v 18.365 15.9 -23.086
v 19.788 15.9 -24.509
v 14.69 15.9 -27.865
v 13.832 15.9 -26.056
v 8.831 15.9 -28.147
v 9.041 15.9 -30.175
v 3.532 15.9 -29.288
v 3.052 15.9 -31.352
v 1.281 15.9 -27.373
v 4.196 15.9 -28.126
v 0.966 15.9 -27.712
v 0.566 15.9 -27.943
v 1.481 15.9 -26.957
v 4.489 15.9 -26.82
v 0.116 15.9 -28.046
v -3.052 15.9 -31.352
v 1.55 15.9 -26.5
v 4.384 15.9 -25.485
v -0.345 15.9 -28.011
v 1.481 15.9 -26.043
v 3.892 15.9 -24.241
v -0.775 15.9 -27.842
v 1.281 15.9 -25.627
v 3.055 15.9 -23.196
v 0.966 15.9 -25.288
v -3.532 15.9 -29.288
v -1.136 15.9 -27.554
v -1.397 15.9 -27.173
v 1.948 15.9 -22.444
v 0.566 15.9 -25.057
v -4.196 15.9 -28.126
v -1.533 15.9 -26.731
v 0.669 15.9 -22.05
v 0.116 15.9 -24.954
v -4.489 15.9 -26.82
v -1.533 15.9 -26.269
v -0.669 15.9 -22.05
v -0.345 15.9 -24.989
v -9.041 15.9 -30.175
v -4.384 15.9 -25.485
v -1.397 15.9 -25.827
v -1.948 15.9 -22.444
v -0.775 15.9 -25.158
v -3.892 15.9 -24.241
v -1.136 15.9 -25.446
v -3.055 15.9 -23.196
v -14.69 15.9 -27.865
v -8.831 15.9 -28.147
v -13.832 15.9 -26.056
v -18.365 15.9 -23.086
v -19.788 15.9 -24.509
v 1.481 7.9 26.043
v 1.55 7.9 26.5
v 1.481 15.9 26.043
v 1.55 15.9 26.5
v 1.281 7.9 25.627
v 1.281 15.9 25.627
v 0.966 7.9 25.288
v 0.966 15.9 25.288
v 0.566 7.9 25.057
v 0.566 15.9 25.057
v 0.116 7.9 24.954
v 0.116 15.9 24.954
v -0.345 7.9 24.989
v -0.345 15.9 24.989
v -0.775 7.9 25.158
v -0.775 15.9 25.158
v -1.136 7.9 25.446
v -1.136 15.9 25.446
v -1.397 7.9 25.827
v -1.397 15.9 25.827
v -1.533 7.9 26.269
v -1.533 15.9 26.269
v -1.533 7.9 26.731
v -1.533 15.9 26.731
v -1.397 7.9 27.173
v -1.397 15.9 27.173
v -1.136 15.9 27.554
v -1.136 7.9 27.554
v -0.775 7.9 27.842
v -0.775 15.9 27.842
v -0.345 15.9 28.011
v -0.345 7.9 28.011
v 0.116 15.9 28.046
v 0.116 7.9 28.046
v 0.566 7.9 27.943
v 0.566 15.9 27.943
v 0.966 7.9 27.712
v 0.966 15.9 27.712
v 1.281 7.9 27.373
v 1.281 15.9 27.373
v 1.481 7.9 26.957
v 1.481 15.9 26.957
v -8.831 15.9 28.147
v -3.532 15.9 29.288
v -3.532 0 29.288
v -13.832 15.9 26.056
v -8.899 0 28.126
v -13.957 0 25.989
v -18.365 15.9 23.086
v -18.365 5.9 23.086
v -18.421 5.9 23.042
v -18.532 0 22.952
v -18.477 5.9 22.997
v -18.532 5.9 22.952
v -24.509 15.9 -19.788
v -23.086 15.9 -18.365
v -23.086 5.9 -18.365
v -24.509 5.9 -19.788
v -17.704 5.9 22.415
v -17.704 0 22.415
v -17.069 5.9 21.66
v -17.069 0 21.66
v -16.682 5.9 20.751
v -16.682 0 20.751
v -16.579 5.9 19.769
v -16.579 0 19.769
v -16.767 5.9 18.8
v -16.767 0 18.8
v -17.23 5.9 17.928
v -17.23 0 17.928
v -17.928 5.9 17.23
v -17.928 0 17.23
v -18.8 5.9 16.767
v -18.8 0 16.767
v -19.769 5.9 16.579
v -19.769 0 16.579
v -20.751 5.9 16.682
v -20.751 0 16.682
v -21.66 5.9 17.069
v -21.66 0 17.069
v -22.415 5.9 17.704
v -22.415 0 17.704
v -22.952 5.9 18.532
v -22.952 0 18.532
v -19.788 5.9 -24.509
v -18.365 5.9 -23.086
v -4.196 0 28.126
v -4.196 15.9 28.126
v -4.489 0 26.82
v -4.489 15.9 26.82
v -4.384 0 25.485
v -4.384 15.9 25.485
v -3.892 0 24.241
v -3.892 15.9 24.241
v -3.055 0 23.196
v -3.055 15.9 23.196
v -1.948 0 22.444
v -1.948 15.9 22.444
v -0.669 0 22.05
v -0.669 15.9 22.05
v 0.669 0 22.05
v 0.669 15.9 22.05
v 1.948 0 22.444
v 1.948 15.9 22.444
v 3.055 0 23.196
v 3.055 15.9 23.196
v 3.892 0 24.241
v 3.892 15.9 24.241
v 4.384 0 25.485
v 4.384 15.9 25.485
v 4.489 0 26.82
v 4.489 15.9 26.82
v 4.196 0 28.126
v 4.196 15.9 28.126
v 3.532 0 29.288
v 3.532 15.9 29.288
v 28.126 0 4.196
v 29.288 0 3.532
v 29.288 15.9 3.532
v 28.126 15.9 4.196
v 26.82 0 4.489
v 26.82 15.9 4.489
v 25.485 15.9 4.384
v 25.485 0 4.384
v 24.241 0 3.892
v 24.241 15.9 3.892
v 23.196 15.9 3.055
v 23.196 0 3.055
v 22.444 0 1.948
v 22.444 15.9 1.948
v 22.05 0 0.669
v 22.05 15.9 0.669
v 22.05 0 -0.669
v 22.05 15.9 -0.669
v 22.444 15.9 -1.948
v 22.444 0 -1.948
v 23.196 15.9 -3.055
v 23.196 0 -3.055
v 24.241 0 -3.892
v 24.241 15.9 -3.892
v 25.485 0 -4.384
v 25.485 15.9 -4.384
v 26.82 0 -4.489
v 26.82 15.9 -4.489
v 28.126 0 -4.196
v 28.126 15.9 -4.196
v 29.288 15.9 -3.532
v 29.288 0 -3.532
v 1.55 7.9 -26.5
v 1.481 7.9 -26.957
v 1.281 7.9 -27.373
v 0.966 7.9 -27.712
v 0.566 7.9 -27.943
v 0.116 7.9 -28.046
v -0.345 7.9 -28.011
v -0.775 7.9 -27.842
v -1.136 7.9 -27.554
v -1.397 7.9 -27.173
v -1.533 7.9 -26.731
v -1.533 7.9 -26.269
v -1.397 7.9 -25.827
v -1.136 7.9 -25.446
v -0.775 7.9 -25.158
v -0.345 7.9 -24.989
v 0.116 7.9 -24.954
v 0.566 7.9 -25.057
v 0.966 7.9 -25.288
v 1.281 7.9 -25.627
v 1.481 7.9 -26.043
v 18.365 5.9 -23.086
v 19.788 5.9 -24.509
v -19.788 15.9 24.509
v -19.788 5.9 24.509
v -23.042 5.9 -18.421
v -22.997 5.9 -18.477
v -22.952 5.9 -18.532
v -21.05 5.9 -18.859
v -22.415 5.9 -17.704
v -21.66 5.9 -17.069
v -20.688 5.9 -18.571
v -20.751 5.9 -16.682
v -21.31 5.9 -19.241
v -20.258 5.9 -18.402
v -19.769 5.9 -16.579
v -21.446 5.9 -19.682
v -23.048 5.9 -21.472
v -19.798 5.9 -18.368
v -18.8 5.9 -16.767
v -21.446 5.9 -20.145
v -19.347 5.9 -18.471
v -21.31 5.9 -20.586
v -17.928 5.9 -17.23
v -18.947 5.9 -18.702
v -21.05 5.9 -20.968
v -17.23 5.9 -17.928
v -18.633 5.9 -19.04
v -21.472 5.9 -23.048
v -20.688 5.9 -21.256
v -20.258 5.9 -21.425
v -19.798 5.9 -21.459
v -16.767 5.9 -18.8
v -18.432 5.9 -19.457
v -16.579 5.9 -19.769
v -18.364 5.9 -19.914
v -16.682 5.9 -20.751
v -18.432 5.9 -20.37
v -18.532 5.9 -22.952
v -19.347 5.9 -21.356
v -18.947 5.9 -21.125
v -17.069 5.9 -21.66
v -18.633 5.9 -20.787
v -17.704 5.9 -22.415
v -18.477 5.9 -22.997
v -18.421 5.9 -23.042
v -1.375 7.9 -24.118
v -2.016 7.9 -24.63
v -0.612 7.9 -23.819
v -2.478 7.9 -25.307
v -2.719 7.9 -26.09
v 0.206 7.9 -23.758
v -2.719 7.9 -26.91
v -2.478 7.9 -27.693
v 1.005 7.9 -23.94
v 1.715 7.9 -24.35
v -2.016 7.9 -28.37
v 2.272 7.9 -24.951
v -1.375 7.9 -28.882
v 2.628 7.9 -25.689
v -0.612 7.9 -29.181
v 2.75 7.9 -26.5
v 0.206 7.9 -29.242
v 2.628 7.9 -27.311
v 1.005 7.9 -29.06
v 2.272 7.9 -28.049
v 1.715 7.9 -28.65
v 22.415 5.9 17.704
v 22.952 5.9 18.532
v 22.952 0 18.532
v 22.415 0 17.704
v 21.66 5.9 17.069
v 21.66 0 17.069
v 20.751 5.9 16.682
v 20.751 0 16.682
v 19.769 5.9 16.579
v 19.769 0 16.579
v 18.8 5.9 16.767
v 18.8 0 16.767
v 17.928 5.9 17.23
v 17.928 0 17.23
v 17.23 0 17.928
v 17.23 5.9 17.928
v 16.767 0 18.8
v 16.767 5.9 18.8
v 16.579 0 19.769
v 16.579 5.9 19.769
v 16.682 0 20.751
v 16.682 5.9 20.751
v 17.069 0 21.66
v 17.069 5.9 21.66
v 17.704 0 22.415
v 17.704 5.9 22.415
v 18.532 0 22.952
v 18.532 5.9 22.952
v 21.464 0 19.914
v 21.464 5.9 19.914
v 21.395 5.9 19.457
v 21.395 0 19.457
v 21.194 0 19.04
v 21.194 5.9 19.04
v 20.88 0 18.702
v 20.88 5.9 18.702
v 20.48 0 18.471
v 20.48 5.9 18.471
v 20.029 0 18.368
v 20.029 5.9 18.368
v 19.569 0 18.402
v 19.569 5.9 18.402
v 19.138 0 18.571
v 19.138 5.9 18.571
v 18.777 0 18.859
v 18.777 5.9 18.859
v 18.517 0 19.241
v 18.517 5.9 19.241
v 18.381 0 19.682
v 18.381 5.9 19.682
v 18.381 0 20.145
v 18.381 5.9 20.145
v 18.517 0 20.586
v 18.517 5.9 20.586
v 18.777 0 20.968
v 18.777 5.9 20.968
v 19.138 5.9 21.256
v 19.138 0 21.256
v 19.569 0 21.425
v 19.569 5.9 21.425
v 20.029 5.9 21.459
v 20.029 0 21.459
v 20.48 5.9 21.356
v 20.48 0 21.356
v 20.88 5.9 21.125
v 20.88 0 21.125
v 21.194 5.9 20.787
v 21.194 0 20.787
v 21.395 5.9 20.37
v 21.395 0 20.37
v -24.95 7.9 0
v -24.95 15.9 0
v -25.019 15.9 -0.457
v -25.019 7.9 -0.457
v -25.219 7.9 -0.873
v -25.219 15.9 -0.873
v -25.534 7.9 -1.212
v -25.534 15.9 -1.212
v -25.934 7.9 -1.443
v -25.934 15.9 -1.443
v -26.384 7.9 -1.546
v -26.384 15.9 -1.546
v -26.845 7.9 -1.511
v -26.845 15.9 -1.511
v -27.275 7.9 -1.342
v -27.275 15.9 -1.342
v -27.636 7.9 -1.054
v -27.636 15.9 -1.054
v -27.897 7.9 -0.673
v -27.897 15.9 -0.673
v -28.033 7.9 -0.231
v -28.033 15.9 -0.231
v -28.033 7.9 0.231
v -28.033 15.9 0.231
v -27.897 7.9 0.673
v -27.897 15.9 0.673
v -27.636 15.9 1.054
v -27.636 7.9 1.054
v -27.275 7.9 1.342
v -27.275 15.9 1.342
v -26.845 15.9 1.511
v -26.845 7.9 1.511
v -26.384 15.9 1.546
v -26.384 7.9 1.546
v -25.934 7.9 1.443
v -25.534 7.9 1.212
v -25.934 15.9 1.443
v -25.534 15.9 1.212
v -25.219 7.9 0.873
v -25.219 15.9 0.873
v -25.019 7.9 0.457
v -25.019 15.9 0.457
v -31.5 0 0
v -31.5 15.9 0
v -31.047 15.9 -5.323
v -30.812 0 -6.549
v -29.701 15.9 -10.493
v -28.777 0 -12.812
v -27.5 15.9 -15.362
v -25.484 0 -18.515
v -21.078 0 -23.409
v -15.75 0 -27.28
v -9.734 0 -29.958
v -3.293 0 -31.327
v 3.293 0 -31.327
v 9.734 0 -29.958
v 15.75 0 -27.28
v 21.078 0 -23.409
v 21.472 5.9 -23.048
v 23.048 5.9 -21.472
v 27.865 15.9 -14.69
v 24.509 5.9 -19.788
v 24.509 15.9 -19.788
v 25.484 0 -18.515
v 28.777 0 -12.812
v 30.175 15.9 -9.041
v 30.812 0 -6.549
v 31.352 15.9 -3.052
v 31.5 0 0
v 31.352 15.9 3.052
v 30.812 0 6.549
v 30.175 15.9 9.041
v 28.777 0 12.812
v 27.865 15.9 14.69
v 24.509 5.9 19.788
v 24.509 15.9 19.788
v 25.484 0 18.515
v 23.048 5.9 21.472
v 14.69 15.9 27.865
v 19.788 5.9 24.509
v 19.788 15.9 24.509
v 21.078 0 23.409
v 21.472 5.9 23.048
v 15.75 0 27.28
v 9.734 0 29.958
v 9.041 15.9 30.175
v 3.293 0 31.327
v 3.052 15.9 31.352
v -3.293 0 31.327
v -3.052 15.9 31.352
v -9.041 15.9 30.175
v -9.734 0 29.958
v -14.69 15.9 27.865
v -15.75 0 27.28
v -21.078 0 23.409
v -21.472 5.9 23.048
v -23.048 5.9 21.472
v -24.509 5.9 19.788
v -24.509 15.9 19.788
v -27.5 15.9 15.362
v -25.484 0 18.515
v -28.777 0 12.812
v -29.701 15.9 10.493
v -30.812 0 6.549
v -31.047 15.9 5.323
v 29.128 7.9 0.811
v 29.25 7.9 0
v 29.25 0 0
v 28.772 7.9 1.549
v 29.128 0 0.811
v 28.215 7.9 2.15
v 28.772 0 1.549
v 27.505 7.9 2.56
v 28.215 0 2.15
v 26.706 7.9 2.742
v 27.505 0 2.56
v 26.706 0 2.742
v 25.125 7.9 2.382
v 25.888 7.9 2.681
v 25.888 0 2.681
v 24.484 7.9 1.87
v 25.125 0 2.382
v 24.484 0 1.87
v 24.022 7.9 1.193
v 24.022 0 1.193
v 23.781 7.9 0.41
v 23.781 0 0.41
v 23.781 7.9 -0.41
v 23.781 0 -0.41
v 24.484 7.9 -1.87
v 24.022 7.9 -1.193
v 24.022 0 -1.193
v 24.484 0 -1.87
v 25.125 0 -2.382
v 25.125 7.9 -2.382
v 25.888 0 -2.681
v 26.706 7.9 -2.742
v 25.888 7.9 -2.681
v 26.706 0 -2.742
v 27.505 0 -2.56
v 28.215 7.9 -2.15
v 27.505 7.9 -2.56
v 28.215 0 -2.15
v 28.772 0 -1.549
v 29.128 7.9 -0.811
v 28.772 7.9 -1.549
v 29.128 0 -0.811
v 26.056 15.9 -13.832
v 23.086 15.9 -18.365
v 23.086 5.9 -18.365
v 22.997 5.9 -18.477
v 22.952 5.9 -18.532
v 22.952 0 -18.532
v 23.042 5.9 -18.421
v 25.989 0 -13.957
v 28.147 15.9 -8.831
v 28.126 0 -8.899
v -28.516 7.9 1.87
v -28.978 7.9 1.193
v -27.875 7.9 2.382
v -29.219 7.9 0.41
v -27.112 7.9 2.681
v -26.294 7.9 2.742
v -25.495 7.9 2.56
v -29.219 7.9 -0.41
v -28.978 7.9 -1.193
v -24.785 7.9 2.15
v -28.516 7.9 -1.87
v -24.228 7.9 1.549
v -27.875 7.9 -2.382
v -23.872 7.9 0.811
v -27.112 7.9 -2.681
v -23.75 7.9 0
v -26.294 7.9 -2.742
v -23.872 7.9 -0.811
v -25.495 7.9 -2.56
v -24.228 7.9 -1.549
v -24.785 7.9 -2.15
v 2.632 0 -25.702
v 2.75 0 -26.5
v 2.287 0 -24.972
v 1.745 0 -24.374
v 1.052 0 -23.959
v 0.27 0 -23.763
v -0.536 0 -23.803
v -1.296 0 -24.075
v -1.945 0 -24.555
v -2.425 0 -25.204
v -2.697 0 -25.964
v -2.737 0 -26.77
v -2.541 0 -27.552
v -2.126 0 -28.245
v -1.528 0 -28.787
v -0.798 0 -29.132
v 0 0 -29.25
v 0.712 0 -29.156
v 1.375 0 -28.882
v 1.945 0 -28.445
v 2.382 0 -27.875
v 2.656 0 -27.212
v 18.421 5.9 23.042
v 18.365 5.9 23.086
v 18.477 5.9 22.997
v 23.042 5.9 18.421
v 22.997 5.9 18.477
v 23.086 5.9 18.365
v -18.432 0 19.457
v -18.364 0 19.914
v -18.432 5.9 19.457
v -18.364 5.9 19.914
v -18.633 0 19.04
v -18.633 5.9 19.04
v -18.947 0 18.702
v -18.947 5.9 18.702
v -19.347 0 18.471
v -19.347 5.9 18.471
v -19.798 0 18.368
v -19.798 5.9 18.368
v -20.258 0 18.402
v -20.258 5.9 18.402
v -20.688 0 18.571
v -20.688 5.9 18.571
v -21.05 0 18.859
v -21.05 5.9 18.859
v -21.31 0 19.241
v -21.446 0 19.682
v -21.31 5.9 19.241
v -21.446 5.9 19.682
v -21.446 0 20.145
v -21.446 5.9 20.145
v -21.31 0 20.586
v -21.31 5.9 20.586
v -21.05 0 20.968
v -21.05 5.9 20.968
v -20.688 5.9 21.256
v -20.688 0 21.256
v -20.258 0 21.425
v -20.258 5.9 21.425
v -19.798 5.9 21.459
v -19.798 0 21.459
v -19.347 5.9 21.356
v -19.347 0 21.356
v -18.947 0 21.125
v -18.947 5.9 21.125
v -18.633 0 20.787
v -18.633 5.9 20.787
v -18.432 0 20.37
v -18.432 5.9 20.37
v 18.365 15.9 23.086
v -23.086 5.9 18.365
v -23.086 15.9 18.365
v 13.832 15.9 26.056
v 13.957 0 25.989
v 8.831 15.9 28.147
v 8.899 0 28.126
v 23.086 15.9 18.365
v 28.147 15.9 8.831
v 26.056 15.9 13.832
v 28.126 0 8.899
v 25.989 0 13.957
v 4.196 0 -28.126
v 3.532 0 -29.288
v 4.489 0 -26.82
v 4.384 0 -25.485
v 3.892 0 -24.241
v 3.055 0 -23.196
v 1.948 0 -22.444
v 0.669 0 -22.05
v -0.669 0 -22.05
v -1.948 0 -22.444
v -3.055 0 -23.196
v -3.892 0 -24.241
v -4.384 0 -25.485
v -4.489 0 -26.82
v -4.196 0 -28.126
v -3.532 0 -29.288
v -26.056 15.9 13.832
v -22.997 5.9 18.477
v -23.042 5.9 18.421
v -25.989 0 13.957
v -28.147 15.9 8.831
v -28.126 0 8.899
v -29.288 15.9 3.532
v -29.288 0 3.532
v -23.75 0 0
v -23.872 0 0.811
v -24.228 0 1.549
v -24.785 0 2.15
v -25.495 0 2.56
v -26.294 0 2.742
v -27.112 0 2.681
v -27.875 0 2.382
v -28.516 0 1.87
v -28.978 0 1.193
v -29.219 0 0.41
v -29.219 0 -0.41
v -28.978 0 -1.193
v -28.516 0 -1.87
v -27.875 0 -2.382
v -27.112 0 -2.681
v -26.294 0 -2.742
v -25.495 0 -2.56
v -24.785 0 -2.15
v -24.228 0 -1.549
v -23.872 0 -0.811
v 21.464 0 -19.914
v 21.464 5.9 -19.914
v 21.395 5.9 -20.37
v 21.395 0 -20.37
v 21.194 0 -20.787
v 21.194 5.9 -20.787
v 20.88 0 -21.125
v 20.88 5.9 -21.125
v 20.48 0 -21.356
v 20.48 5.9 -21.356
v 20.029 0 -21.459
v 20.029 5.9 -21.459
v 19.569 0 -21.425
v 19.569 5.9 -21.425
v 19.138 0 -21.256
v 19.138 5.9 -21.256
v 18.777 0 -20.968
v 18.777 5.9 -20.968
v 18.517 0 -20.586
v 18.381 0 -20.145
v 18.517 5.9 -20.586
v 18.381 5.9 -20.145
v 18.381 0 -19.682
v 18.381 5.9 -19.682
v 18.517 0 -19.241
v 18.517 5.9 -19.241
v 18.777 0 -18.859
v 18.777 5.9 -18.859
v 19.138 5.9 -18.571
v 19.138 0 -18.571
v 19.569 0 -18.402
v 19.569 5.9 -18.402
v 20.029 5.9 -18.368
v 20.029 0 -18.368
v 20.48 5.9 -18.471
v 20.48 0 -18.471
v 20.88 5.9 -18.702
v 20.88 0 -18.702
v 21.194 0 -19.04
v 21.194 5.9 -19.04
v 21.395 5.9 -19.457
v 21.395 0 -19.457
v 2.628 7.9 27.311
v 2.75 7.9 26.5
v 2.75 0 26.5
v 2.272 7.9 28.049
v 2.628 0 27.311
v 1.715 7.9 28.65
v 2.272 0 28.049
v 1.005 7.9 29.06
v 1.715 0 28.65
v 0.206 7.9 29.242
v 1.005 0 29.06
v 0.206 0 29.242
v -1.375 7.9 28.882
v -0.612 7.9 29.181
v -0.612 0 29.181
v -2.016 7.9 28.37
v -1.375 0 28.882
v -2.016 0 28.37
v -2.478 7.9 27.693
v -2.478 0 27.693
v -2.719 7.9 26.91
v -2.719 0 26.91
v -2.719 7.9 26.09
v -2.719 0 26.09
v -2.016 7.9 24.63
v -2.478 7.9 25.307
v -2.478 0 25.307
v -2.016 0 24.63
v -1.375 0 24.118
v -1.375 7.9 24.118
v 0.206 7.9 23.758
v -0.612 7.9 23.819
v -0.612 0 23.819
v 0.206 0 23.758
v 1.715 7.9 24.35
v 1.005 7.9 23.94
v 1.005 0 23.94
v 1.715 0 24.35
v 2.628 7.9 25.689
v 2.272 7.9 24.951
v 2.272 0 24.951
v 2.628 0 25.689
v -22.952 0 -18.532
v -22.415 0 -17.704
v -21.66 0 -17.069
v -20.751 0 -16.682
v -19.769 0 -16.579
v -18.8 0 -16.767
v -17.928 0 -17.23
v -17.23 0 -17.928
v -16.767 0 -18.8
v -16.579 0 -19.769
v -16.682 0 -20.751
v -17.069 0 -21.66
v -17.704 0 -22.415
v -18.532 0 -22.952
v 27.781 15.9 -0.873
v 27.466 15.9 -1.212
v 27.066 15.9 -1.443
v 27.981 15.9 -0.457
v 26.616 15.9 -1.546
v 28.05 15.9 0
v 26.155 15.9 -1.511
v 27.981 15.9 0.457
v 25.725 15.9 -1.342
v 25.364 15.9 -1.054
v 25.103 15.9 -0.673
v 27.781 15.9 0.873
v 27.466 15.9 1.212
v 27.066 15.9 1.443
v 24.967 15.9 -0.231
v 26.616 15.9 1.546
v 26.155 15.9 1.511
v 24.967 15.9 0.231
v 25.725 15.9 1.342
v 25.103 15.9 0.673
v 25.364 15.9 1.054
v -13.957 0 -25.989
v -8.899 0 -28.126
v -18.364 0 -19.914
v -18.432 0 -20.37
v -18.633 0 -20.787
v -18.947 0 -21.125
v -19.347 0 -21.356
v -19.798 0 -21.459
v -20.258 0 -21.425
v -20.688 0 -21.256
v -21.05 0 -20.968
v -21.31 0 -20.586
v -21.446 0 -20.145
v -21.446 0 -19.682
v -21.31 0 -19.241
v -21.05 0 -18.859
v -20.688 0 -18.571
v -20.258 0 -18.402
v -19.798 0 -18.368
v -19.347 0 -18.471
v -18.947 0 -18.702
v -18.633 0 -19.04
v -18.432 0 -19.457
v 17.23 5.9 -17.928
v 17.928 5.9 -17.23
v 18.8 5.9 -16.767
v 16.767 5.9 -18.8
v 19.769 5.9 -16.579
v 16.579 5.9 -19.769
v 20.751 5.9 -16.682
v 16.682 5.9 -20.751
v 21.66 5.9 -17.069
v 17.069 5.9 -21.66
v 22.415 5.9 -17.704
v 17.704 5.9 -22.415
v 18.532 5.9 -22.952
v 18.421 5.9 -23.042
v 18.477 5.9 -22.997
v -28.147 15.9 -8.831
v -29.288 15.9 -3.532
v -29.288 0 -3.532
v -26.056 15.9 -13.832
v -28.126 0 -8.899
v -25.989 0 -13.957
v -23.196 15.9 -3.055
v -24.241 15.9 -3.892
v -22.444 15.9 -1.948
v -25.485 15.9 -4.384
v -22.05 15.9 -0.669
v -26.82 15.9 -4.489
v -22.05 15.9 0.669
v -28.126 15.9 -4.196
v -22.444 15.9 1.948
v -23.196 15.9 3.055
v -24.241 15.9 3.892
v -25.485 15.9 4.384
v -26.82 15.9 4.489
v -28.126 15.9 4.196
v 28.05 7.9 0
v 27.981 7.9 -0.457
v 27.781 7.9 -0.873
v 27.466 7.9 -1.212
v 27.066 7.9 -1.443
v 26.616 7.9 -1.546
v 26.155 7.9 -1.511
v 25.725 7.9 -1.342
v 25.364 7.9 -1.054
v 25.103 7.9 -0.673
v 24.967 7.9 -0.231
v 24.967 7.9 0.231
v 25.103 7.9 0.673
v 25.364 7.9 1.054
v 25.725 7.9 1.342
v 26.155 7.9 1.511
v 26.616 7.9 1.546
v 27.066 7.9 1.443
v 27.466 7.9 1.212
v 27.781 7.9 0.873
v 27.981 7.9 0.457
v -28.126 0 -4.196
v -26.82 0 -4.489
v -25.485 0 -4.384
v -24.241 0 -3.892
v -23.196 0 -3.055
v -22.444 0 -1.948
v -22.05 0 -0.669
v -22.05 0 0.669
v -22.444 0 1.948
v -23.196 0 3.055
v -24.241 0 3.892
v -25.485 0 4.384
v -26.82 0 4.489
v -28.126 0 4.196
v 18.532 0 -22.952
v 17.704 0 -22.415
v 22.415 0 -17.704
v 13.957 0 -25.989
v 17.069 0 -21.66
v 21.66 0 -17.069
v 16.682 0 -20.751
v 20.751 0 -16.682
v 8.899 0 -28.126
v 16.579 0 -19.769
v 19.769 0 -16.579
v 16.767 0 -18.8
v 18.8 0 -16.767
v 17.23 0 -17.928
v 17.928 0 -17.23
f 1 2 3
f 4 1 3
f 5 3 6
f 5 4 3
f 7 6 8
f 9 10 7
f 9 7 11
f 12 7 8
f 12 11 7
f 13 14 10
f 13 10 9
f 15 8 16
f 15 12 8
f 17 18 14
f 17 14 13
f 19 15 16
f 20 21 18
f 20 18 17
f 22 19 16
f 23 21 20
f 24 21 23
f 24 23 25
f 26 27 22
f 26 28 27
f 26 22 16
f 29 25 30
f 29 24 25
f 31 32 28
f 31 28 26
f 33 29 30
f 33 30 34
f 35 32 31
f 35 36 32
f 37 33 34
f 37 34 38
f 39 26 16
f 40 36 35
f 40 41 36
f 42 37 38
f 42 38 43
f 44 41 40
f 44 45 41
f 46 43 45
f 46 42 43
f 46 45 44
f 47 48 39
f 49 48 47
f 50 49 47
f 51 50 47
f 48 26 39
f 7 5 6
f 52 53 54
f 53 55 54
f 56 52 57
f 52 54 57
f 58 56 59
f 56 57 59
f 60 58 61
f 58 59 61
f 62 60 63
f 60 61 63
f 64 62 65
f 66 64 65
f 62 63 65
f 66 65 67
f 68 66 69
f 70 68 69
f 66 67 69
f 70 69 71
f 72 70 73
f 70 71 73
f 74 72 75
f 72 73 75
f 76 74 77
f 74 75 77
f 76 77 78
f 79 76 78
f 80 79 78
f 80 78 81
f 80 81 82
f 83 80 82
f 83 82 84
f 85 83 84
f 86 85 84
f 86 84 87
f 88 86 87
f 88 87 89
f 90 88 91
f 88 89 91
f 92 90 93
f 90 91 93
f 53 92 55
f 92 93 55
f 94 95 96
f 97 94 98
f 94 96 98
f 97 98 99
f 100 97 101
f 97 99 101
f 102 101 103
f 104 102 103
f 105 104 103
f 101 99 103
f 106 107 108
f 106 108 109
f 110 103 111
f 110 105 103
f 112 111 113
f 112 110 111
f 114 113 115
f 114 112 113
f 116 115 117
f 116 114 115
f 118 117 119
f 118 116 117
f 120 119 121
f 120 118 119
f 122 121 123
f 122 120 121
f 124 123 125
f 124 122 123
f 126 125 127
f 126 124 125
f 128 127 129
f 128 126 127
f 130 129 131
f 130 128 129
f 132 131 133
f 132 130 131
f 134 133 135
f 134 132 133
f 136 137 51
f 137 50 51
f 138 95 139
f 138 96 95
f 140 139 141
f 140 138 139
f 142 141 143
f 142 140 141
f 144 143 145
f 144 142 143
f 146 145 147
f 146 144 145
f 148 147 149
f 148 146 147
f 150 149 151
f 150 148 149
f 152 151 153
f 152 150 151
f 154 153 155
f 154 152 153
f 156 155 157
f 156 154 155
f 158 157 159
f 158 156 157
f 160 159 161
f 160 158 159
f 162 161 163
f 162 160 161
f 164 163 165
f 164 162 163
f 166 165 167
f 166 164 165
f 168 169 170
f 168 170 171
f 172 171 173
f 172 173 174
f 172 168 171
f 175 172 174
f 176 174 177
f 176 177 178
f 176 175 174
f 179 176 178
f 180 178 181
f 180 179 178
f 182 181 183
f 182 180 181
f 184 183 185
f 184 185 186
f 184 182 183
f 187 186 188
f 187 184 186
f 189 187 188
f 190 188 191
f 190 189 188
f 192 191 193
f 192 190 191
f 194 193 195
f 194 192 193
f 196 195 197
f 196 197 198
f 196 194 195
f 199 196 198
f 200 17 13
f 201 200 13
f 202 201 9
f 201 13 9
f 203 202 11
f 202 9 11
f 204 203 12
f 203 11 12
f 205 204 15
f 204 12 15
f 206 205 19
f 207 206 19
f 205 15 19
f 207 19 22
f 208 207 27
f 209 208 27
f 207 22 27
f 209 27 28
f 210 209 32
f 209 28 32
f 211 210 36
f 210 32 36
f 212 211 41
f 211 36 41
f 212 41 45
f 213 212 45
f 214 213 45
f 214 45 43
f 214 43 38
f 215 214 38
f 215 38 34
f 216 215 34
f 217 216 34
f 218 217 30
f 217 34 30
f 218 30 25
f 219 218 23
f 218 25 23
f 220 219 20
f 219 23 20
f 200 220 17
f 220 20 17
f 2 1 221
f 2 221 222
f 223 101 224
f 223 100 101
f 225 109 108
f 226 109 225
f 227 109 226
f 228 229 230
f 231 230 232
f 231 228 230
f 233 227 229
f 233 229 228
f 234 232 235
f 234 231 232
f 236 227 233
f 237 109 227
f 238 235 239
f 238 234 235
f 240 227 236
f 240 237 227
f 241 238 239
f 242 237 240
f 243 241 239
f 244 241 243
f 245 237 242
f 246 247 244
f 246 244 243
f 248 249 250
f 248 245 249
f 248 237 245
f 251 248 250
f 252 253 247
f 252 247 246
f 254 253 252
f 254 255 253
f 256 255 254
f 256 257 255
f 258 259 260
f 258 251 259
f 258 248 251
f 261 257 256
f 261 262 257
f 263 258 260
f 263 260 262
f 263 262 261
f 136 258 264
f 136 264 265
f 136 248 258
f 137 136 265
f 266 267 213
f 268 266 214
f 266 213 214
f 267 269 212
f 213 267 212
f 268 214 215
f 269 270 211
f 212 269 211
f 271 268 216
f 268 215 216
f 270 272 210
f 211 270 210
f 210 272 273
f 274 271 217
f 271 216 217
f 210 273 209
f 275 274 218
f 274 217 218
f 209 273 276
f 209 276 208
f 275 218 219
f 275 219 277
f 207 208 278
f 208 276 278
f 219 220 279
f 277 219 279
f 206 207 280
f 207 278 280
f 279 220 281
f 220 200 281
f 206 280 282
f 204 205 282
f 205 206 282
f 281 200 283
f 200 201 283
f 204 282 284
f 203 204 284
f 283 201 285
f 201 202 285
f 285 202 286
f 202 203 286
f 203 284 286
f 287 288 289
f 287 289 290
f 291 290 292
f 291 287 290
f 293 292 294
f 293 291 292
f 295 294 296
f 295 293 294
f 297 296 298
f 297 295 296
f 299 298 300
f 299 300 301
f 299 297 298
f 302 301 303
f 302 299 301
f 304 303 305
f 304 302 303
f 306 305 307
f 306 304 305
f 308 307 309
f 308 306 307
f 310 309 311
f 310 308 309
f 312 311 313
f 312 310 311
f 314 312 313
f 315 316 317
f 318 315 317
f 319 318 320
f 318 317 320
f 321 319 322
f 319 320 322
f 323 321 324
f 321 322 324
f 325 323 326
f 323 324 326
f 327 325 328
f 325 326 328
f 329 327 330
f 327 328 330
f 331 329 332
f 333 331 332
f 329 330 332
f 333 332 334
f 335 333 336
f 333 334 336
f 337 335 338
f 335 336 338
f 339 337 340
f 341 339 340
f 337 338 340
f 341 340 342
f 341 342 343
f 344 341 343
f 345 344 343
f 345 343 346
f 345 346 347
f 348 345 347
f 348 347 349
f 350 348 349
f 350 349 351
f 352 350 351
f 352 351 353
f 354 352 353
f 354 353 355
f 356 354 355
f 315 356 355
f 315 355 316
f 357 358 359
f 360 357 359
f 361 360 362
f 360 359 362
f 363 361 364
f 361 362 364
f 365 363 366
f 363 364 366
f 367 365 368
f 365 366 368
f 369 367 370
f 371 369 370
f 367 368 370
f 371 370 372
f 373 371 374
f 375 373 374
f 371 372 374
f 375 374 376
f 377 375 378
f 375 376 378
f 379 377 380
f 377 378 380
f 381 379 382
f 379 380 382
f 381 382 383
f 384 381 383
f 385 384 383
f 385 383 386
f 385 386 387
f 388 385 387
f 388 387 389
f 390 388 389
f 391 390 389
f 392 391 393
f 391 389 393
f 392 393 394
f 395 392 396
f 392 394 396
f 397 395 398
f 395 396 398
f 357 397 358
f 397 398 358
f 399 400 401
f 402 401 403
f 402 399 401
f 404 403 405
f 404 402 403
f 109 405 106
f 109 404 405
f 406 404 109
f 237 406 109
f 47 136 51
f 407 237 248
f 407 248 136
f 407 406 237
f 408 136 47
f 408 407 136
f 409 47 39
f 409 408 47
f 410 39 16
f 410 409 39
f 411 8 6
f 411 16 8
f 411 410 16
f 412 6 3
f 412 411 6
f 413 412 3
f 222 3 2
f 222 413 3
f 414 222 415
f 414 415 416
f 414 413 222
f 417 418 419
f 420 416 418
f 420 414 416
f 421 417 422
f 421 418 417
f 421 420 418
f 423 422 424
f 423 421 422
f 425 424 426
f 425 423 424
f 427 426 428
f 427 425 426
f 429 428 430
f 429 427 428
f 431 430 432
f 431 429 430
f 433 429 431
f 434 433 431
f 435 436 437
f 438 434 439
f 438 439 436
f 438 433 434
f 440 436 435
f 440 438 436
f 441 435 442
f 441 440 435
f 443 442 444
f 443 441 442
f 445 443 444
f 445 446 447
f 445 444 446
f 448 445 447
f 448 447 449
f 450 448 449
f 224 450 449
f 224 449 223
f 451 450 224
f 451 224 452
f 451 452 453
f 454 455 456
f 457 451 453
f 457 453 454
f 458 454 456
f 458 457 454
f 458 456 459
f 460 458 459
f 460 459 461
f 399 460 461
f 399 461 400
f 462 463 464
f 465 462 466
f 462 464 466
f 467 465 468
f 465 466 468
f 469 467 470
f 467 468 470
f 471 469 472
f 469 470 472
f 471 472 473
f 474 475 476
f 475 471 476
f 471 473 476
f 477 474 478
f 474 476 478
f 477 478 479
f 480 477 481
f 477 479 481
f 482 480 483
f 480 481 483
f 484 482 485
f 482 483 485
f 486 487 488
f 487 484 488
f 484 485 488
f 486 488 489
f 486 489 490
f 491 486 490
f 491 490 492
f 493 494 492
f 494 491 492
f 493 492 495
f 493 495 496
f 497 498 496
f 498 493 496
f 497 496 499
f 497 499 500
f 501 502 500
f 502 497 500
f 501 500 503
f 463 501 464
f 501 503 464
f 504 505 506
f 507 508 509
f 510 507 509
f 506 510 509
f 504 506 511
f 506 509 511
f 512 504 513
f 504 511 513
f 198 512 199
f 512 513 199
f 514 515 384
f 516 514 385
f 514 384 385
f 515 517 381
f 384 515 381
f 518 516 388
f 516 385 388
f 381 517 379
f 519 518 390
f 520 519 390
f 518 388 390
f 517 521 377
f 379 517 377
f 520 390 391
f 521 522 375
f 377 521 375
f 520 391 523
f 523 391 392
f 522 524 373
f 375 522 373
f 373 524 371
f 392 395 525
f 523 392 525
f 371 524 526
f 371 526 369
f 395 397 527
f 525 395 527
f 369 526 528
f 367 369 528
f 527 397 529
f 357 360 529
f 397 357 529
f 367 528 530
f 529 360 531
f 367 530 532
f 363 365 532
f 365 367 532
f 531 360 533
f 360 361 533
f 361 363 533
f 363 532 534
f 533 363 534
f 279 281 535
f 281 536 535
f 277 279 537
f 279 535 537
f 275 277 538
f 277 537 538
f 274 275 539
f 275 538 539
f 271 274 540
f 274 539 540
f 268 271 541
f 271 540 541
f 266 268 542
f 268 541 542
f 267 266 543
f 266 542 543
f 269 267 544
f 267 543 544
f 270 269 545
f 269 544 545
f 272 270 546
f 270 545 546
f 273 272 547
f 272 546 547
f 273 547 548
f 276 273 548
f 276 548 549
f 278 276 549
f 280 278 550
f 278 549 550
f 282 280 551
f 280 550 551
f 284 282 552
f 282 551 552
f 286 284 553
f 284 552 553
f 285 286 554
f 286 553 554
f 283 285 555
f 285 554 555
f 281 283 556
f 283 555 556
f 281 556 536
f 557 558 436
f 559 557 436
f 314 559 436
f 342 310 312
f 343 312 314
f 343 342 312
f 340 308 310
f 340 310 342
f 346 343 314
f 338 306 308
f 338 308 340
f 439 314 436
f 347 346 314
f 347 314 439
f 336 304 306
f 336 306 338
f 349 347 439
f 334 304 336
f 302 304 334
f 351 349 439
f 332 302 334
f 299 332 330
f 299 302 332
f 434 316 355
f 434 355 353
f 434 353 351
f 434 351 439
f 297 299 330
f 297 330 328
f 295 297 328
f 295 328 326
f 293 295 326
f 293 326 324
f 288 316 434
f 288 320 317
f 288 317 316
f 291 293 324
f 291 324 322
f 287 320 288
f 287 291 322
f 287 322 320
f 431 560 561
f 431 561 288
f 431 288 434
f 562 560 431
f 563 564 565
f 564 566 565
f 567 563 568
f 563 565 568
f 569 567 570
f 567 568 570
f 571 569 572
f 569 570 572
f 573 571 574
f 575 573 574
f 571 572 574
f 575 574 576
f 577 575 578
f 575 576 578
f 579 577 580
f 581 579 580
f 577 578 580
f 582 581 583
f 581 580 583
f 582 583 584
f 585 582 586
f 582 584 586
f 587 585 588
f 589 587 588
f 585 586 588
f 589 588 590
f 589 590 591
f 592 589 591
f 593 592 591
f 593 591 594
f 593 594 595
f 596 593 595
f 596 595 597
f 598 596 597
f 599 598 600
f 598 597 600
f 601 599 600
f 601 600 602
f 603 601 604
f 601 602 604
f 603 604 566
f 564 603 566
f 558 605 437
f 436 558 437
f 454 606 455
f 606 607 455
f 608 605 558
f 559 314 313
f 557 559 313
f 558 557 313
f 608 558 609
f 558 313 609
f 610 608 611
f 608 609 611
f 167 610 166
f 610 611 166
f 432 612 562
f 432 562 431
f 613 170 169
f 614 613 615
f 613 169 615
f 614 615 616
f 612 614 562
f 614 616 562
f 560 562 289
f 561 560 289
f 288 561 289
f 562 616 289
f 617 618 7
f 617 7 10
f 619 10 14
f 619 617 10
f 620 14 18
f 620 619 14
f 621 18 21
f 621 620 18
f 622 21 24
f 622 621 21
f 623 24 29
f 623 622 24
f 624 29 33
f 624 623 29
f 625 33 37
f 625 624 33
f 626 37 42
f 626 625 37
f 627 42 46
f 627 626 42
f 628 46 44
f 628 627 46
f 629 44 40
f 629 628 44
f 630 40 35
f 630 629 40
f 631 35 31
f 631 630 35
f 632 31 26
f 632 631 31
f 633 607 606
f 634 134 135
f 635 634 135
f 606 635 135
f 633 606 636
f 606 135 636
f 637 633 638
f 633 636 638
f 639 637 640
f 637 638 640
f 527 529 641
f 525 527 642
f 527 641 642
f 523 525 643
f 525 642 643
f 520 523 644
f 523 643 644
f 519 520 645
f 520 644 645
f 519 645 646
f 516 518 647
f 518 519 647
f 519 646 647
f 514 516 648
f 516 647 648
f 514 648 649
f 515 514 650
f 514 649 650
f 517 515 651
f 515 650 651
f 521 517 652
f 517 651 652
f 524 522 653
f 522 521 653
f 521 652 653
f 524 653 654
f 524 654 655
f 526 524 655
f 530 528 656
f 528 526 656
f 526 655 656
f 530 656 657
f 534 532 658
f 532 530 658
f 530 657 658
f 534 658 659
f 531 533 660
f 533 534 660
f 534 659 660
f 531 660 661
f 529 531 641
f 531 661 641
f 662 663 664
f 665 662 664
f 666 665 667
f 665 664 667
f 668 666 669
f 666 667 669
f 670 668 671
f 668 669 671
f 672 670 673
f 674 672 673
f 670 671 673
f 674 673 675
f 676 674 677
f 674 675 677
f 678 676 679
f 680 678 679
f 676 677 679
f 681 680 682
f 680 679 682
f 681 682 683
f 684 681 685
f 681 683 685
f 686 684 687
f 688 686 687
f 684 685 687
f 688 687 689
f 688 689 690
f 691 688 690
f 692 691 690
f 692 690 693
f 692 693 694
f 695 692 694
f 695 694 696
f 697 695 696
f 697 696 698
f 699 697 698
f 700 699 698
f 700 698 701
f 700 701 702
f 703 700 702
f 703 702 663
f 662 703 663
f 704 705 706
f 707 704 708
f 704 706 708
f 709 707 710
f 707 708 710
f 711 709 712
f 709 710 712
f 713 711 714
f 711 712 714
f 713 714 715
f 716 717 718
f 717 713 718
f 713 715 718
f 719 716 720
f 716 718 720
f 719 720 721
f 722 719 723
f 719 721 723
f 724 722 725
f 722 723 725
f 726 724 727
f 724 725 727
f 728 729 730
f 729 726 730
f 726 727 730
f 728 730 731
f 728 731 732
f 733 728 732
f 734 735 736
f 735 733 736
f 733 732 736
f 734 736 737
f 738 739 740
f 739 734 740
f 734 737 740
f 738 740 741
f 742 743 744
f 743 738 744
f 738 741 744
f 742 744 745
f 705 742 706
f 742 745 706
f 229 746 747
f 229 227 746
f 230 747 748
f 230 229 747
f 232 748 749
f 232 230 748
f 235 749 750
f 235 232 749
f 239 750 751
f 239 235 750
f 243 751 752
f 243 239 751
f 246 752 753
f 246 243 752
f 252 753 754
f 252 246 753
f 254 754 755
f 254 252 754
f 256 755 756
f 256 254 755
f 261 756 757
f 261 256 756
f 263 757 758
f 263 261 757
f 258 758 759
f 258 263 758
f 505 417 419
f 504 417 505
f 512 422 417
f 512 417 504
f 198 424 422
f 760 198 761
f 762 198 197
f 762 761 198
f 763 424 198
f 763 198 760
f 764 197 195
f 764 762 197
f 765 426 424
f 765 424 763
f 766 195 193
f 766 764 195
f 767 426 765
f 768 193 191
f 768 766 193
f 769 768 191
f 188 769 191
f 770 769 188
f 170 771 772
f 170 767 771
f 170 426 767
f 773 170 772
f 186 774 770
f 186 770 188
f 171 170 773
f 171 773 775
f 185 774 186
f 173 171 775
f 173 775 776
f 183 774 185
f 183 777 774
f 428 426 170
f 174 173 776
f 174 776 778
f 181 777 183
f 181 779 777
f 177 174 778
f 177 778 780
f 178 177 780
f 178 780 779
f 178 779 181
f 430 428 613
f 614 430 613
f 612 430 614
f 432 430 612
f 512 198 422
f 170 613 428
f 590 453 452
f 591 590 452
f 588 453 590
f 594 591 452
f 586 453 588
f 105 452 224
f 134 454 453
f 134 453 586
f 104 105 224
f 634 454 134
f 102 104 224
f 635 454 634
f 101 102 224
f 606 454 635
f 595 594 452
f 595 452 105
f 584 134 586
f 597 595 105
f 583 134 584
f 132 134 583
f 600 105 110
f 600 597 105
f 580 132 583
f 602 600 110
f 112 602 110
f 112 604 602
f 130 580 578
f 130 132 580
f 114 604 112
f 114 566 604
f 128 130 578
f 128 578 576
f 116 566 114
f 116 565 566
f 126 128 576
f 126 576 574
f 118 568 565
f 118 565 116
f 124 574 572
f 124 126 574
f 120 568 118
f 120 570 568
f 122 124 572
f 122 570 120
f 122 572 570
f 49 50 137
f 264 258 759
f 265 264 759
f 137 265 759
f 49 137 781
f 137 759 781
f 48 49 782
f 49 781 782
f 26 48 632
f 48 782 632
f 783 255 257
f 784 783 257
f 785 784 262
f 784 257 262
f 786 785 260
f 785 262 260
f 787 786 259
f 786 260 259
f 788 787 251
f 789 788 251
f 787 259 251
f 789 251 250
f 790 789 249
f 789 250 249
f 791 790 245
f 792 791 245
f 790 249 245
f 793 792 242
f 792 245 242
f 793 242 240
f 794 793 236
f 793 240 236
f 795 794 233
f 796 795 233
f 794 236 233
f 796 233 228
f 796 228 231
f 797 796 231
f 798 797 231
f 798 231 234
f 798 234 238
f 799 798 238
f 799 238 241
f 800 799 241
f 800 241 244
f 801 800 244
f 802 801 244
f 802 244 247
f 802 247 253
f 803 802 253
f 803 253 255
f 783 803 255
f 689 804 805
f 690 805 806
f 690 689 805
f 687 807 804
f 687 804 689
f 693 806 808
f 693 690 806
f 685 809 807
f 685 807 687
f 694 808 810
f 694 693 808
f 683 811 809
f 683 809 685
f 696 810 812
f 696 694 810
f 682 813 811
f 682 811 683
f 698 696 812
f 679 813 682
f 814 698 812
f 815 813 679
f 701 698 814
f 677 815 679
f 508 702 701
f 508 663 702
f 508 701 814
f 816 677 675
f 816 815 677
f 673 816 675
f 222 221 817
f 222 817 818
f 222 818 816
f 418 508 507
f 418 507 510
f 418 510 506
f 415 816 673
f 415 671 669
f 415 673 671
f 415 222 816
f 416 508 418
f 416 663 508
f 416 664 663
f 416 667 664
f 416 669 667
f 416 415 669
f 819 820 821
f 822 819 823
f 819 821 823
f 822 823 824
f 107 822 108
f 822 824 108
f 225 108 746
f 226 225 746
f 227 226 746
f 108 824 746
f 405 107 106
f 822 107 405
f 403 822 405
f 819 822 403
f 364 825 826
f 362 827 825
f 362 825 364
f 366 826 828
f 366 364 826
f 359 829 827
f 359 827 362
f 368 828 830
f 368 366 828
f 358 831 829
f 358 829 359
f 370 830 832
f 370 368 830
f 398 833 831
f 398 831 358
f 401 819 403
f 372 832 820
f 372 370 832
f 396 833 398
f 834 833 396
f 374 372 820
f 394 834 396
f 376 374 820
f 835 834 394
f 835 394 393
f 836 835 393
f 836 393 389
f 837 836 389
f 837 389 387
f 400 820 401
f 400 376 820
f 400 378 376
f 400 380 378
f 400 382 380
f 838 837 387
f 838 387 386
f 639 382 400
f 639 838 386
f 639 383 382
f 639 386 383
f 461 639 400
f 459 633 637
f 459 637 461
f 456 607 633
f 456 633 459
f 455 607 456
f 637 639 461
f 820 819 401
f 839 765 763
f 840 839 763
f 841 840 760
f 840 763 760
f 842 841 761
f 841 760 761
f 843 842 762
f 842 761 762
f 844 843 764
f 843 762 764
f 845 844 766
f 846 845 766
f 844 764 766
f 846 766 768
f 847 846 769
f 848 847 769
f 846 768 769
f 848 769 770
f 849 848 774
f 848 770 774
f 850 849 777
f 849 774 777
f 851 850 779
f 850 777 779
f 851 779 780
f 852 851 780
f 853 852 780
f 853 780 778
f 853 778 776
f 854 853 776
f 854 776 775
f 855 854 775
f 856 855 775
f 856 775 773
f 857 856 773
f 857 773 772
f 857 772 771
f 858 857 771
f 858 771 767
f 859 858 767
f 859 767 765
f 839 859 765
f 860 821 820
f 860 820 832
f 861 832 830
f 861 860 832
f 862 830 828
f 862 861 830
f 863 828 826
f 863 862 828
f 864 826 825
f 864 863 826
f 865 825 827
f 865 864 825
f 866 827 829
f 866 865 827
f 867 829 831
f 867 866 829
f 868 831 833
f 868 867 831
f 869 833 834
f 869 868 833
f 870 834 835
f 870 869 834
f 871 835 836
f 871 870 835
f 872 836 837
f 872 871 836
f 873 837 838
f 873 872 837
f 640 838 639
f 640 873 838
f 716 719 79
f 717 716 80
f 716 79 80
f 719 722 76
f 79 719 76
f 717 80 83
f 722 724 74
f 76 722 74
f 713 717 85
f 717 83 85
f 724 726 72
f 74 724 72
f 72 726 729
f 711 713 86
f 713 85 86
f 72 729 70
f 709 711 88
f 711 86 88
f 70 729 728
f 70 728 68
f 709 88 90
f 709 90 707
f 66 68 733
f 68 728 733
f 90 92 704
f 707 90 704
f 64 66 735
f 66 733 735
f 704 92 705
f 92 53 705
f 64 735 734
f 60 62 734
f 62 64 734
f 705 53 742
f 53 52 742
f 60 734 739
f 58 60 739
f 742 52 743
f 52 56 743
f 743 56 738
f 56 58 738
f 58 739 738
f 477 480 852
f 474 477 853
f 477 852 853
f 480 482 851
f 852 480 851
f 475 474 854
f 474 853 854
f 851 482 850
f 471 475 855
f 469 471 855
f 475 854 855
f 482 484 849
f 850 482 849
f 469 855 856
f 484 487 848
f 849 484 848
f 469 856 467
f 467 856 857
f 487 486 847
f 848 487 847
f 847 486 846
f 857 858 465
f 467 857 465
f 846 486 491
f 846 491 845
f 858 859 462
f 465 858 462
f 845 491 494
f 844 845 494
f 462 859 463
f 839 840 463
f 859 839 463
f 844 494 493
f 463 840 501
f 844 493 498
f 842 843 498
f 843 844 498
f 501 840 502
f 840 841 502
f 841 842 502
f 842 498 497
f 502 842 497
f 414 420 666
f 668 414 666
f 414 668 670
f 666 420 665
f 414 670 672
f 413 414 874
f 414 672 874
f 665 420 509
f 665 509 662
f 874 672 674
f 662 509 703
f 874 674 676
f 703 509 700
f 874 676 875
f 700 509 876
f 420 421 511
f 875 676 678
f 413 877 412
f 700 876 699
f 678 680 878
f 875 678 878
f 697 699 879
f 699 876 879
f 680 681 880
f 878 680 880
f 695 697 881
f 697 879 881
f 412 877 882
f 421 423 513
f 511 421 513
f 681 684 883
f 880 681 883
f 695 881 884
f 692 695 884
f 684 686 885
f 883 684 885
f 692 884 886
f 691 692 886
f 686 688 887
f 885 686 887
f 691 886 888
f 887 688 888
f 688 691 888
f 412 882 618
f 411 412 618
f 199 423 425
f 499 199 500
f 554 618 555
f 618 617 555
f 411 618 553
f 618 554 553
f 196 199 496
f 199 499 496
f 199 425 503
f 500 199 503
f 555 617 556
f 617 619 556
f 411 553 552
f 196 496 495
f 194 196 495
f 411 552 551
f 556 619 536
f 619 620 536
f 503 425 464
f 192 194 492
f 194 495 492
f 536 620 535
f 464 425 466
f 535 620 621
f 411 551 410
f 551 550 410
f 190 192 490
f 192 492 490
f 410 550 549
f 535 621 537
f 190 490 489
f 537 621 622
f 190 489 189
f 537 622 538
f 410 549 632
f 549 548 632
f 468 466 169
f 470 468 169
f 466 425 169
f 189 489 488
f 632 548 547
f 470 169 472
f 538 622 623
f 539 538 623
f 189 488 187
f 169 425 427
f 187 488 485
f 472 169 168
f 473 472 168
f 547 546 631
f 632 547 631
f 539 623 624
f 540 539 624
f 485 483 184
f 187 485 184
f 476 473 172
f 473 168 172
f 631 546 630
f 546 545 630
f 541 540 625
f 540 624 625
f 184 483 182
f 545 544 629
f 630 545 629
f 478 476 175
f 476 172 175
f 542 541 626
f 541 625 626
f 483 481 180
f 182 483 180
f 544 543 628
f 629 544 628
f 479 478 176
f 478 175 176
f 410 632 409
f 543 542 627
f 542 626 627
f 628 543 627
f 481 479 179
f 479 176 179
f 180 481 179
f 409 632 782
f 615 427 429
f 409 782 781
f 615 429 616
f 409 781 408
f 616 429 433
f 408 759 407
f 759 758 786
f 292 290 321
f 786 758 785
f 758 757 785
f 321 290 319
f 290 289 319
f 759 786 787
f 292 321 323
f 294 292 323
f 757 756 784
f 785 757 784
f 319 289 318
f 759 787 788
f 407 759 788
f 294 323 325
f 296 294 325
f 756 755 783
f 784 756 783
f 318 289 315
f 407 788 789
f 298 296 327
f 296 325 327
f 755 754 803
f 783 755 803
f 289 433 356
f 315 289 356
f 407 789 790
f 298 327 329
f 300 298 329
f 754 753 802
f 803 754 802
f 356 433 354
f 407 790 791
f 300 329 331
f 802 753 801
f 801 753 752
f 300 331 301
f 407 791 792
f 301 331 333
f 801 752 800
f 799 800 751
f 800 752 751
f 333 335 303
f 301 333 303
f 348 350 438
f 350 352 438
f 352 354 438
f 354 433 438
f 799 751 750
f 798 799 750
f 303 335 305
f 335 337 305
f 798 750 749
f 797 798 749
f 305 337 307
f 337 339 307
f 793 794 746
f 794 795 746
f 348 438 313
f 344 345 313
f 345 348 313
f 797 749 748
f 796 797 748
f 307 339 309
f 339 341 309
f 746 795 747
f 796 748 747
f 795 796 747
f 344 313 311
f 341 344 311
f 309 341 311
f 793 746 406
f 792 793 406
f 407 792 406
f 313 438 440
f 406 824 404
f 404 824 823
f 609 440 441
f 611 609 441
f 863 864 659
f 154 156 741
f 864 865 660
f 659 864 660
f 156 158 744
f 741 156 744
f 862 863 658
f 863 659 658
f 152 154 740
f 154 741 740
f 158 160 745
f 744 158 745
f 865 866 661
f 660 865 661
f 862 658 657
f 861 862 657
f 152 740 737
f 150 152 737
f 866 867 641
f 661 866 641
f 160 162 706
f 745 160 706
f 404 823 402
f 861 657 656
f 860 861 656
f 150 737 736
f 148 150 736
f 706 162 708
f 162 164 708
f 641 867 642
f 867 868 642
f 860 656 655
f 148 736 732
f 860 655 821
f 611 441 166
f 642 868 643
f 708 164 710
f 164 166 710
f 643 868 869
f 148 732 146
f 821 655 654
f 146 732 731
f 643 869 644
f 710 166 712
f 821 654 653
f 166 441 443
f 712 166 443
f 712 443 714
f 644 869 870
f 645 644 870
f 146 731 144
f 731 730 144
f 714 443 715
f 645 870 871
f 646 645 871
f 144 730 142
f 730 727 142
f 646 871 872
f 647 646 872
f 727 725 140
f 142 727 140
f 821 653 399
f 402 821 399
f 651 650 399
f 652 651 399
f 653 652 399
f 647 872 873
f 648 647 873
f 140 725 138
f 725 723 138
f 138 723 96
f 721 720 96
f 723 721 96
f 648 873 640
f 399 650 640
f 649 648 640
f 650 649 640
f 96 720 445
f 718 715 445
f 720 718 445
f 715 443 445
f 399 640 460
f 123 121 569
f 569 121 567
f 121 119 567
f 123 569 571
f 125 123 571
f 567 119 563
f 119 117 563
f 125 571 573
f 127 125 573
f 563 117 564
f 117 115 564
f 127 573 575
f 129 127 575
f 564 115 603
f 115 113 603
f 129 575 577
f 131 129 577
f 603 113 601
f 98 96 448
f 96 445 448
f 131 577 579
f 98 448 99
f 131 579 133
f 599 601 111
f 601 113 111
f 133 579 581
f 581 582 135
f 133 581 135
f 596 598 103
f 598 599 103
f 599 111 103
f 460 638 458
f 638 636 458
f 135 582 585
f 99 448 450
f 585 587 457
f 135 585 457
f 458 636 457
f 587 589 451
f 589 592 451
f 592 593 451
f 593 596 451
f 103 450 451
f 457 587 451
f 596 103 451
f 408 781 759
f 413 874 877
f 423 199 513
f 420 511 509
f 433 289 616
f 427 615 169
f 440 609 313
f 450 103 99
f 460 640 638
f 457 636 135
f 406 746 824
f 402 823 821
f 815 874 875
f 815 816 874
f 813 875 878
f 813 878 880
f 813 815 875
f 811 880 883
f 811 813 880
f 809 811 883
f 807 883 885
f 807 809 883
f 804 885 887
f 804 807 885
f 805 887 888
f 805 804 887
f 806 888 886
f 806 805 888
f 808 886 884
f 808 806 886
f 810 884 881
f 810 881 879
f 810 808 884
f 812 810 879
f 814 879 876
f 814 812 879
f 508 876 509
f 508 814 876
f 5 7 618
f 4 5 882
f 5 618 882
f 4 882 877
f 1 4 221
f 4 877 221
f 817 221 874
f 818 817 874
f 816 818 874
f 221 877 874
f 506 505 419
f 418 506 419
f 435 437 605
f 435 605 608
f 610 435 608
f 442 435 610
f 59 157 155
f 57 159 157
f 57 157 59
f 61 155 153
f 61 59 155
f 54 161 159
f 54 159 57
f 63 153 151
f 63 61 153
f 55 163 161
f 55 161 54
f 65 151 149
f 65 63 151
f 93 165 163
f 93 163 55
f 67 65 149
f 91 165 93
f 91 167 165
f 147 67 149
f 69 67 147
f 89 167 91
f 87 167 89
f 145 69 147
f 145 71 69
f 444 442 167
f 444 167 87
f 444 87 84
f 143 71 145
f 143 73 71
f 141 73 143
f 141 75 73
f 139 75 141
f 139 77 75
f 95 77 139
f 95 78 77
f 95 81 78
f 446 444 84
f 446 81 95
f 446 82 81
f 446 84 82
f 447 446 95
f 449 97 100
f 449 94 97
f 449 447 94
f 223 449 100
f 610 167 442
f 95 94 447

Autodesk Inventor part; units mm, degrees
ref_plane "YZ Plane" through (0, 0, 0) normal (1, 0, 0) x (0, 1, 0)
ref_plane "XZ Plane" through (0, 0, 0) normal (0, 1, 0) x (-1, 0, 0)
ref_plane "XY Plane" through (0, 0, 0) normal (0, 0, 1) x (1, 0, 0)
sketch "Sketch1" plane through (0, 0, 0) normal (0, 1, 0) x (-1, 0, 0)
  circle A0 centre (0, 0) radius 31.5
  circle A1 centre (0, 0) radius 29.5
  dimension "d0" = 63
  dimension "d1" = 59
extrude "Walls" add sketch "Sketch1" along normal blind 15.9
sketch "Sketch2" plane through (0, 0, 0) normal (0, -1, 0) x (1, 0, 0)
  circle A0 centre (0, 0) radius 31.5 projected
  line L0 (0, -31.5) -> (0, -26.5)
  circle A1 centre (0, -26.5) radius 2.75
  circle A2 centre (0, -26.5) radius 4.5
  circle A3 centre (26.5, 0) radius 4.5
  circle A4 centre (26.5, 0) radius 2.75
  circle A5 centre (0, 26.5) radius 4.5
  circle A6 centre (0, 26.5) radius 2.75
  circle A7 centre (-26.5, 0) radius 4.5
  circle A8 centre (-26.5, 0) radius 2.75
  dimension "d4" = 5
  dimension "d5" = 5.5
  dimension "d6" = 9
  dimension "d9" = 360
extrude "Pillar holes" add sketch "Sketch2" against normal blind 15.9 contours A2 | A3 | A5 | A7
sketch "Sketch4" plane through (0, 15.9, 0) normal (0, 1, 0) x (1, 0, 0)
  point P0 (0, 0)
sketch "Sketch5" plane through (0, 0, 0) normal (0, -1, 0) x (1, 0, 0)
  point P0 (0, 0)
sketch "Sketch6" plane through (0, 15.9, 0) normal (0, 1, 0) x (1, 0, 0)
  circle A0 centre (0, 26.5) radius 2.75 projected
  circle A1 centre (0, 26.5) radius 2.75
  circle A2 centre (0, 26.5) radius 1.55
  circle A3 centre (-26.5, 0) radius 1.55
  circle A4 centre (-26.5, 0) radius 2.75
  circle A5 centre (0, -26.5) radius 1.55
  circle A6 centre (0, -26.5) radius 2.75
  circle A7 centre (26.5, 0) radius 1.55
  circle A8 centre (26.5, 0) radius 2.75
  point P0 (0, 0)
  dimension "d20" = 3.1
  dimension "d23" = 360
extrude "Extrusion4" add sketch "Sketch6" against normal blind 8
sketch "Sketch7" plane through (0, 15.9, 0) normal (0, 1, 0) x (1, 0, 0)
  line L0 (0, 0) -> (22.2739, -22.2739)
  circle A0 centre (0, 0) radius 31.5 projected
  line L1 (0, 0) -> (0, -31.5)
  line L2 (0, 0) -> (-22.2739, -22.2739)
  dimension "d27" = 45
ref_plane "Work Plane1" through (22.2739, 15.9, 22.2739) normal (0.7071, 0, 0.7071) x (0, 1, 0)
ref_plane "Work Plane2" through (-22.2739, 15.9, 22.2739) normal (-0.7071, 0, 0.7071) x (0, -1, 0)
sketch "Sketch17" plane through (0, 15.9, 0) normal (0, 1, 0) x (1, 0, 0)
  line L0 (0, 0) -> (-22.2739, -22.2739)
  line L1 (0, 0) -> (0, -14.1086)
  line L2 (-22.2739, -22.2739) -> (-19.9135, -19.9135)
  circle A0 centre (-19.9135, -19.9135) radius 1.55
  circle A1 centre (-19.9135, -19.9135) radius 3.338
  circle A2 centre (19.9135, -19.9135) radius 1.55
  circle A3 centre (19.9135, -19.9135) radius 3.338
  circle A4 centre (19.9135, 19.9135) radius 1.55
  circle A5 centre (19.9135, 19.9135) radius 3.338
  circle A6 centre (-19.9135, 19.9135) radius 1.55
  circle A7 centre (-19.9135, 19.9135) radius 3.338
  point P0 (22.2739, -22.2739)
  point P1 (22.2739, 22.2739)
  point P2 (-22.2739, 22.2739)
  dimension "d86" = 31.5
  dimension "d87" = 45
  dimension "d88" = 3.338
  dimension "d89" = 3.1
  dimension "d92" = 360
extrude "Extrusion13" add sketch "Sketch17" against normal blind 15.9 contours A1 L0 A0 | L0 A0 A1 | A0 L0 | L0 A0 | A2 | A3 | A4 | A5 | A6 | A7
sketch "Sketch18" plane through (0, 15.9, 0) normal (0, 1, 0) x (1, 0, 0)
  circle A0 centre (0, 0) radius 31.5 projected
  line L0 (0, 0) -> (-22.2739, -22.2739)
  line L1 (0, 0) -> (0, -10.409)
  line L2 (-22.2739, -22.2739) -> (-19.9135, -19.9135)
  circle A1 centre (-19.9135, -19.9135) radius 1.55
  circle A2 centre (19.9135, -19.9135) radius 1.55
  circle A3 centre (19.9135, 19.9135) radius 1.55
  circle A4 centre (-19.9135, 19.9135) radius 1.55
  dimension "d96" = 45
  dimension "d97" = 3.338
  dimension "d98" = 3.1
  dimension "d101" = 360
extrude "Extrusion14" cut sketch "Sketch18" against normal blind 15.9 contours A1 L0 | L0 A1 | A2 | A3 | A4
sketch "Sketch19" plane through (0, 15.9, 0) normal (0, 1, 0) x (1, 0, 0)
  arc A0 (22.9523, -18.5322) -> (18.5322, -22.9523) centre (19.9135, -19.9135) ccw projected
  circle A1 centre (19.9135, -19.9135) radius 3.338
  circle A2 centre (19.9135, -19.9135) radius 1.55 projected
  line L0 (19.9135, -19.9135) -> (17.5532, -22.2739)
  line L1 (19.9135, -19.9135) -> (22.2739, -17.5532)
  line L2 (17.5532, -22.2739) -> (19.7881, -24.5088)
  circle A3 centre (0, 0) radius 31.5 projected
  line L3 (22.2739, -17.5532) -> (24.5088, -19.7881)
  line L4 (17.5532, -17.5532) -> (19.9135, -15.1929)
  line L5 (19.9135, -15.1929) -> (22.2739, -17.5532)
  line L6 (17.5532, -17.5532) -> (15.1929, -19.9135)
  line L7 (15.1929, -19.9135) -> (17.5532, -22.2739)
  arc A4 (19.7881, -24.5088) -> (24.5088, -19.7881) centre (0, 0) ccw
  line L8 (19.9135, 15.1929) -> (22.2739, 17.5532)
  line L9 (22.2739, 17.5532) -> (24.5088, 19.7881)
  arc A5 (24.5088, 19.7881) -> (19.7881, 24.5088) centre (0, 0) ccw
  circle A6 centre (19.9135, 19.9135) radius 3.338
  line L10 (17.5532, 17.5532) -> (15.1929, 19.9135)
  line L11 (17.5532, 17.5532) -> (19.9135, 15.1929)
  line L12 (15.1929, 19.9135) -> (17.5532, 22.2739)
  line L13 (17.5532, 22.2739) -> (19.7881, 24.5088)
  line L14 (-15.1929, 19.9135) -> (-17.5532, 22.2739)
  line L15 (-17.5532, 22.2739) -> (-19.7881, 24.5088)
  arc A7 (-19.7881, 24.5088) -> (-24.5088, 19.7881) centre (0, 0) ccw
  circle A8 centre (-19.9135, 19.9135) radius 3.338
  line L16 (-17.5532, 17.5532) -> (-19.9135, 15.1929)
  line L17 (-17.5532, 17.5532) -> (-15.1929, 19.9135)
  line L18 (-19.9135, 15.1929) -> (-22.2739, 17.5532)
  line L19 (-22.2739, 17.5532) -> (-24.5088, 19.7881)
  line L20 (-19.9135, -15.1929) -> (-22.2739, -17.5532)
  line L21 (-22.2739, -17.5532) -> (-24.5088, -19.7881)
  arc A9 (-24.5088, -19.7881) -> (-19.7881, -24.5088) centre (0, 0) ccw
  circle A10 centre (-19.9135, -19.9135) radius 3.338
  line L22 (-17.5532, -17.5532) -> (-15.1929, -19.9135)
  line L23 (-17.5532, -17.5532) -> (-19.9135, -15.1929)
  line L24 (-15.1929, -19.9135) -> (-17.5532, -22.2739)
  line L25 (-17.5532, -22.2739) -> (-19.7881, -24.5088)
  line L26 (19.9135, -15.1929) -> (24.5088, -19.7881)
  line L27 (15.1929, -19.9135) -> (19.7881, -24.5088)
  line L28 (19.9135, -15.1929) -> (15.1929, -19.9135)
  arc A11 (19.7881, -24.5088) -> (24.5088, -19.7881) centre (0, 0) ccw
  point P0 (19.7881, 24.5088)
  point P1 (-24.5088, 19.7881)
  point P2 (-19.7881, -24.5088)
  dimension "d107" = 360
extrude "Extrusion15" cut sketch "Sketch19" against normal blind 10 contours A1 A0 L0 A2 L1 | A0 L3 A3 A1 | L1 A2 L0 A0 | A3 L2 A0 A1 | L9 A6 A3 | A3 A10 L25 | A6 L13 A3 | A6 | A3 L21 A10 | A10 | L15 A8 A3 | A3 A8 L19 | A8
properties part number "cylinder"
